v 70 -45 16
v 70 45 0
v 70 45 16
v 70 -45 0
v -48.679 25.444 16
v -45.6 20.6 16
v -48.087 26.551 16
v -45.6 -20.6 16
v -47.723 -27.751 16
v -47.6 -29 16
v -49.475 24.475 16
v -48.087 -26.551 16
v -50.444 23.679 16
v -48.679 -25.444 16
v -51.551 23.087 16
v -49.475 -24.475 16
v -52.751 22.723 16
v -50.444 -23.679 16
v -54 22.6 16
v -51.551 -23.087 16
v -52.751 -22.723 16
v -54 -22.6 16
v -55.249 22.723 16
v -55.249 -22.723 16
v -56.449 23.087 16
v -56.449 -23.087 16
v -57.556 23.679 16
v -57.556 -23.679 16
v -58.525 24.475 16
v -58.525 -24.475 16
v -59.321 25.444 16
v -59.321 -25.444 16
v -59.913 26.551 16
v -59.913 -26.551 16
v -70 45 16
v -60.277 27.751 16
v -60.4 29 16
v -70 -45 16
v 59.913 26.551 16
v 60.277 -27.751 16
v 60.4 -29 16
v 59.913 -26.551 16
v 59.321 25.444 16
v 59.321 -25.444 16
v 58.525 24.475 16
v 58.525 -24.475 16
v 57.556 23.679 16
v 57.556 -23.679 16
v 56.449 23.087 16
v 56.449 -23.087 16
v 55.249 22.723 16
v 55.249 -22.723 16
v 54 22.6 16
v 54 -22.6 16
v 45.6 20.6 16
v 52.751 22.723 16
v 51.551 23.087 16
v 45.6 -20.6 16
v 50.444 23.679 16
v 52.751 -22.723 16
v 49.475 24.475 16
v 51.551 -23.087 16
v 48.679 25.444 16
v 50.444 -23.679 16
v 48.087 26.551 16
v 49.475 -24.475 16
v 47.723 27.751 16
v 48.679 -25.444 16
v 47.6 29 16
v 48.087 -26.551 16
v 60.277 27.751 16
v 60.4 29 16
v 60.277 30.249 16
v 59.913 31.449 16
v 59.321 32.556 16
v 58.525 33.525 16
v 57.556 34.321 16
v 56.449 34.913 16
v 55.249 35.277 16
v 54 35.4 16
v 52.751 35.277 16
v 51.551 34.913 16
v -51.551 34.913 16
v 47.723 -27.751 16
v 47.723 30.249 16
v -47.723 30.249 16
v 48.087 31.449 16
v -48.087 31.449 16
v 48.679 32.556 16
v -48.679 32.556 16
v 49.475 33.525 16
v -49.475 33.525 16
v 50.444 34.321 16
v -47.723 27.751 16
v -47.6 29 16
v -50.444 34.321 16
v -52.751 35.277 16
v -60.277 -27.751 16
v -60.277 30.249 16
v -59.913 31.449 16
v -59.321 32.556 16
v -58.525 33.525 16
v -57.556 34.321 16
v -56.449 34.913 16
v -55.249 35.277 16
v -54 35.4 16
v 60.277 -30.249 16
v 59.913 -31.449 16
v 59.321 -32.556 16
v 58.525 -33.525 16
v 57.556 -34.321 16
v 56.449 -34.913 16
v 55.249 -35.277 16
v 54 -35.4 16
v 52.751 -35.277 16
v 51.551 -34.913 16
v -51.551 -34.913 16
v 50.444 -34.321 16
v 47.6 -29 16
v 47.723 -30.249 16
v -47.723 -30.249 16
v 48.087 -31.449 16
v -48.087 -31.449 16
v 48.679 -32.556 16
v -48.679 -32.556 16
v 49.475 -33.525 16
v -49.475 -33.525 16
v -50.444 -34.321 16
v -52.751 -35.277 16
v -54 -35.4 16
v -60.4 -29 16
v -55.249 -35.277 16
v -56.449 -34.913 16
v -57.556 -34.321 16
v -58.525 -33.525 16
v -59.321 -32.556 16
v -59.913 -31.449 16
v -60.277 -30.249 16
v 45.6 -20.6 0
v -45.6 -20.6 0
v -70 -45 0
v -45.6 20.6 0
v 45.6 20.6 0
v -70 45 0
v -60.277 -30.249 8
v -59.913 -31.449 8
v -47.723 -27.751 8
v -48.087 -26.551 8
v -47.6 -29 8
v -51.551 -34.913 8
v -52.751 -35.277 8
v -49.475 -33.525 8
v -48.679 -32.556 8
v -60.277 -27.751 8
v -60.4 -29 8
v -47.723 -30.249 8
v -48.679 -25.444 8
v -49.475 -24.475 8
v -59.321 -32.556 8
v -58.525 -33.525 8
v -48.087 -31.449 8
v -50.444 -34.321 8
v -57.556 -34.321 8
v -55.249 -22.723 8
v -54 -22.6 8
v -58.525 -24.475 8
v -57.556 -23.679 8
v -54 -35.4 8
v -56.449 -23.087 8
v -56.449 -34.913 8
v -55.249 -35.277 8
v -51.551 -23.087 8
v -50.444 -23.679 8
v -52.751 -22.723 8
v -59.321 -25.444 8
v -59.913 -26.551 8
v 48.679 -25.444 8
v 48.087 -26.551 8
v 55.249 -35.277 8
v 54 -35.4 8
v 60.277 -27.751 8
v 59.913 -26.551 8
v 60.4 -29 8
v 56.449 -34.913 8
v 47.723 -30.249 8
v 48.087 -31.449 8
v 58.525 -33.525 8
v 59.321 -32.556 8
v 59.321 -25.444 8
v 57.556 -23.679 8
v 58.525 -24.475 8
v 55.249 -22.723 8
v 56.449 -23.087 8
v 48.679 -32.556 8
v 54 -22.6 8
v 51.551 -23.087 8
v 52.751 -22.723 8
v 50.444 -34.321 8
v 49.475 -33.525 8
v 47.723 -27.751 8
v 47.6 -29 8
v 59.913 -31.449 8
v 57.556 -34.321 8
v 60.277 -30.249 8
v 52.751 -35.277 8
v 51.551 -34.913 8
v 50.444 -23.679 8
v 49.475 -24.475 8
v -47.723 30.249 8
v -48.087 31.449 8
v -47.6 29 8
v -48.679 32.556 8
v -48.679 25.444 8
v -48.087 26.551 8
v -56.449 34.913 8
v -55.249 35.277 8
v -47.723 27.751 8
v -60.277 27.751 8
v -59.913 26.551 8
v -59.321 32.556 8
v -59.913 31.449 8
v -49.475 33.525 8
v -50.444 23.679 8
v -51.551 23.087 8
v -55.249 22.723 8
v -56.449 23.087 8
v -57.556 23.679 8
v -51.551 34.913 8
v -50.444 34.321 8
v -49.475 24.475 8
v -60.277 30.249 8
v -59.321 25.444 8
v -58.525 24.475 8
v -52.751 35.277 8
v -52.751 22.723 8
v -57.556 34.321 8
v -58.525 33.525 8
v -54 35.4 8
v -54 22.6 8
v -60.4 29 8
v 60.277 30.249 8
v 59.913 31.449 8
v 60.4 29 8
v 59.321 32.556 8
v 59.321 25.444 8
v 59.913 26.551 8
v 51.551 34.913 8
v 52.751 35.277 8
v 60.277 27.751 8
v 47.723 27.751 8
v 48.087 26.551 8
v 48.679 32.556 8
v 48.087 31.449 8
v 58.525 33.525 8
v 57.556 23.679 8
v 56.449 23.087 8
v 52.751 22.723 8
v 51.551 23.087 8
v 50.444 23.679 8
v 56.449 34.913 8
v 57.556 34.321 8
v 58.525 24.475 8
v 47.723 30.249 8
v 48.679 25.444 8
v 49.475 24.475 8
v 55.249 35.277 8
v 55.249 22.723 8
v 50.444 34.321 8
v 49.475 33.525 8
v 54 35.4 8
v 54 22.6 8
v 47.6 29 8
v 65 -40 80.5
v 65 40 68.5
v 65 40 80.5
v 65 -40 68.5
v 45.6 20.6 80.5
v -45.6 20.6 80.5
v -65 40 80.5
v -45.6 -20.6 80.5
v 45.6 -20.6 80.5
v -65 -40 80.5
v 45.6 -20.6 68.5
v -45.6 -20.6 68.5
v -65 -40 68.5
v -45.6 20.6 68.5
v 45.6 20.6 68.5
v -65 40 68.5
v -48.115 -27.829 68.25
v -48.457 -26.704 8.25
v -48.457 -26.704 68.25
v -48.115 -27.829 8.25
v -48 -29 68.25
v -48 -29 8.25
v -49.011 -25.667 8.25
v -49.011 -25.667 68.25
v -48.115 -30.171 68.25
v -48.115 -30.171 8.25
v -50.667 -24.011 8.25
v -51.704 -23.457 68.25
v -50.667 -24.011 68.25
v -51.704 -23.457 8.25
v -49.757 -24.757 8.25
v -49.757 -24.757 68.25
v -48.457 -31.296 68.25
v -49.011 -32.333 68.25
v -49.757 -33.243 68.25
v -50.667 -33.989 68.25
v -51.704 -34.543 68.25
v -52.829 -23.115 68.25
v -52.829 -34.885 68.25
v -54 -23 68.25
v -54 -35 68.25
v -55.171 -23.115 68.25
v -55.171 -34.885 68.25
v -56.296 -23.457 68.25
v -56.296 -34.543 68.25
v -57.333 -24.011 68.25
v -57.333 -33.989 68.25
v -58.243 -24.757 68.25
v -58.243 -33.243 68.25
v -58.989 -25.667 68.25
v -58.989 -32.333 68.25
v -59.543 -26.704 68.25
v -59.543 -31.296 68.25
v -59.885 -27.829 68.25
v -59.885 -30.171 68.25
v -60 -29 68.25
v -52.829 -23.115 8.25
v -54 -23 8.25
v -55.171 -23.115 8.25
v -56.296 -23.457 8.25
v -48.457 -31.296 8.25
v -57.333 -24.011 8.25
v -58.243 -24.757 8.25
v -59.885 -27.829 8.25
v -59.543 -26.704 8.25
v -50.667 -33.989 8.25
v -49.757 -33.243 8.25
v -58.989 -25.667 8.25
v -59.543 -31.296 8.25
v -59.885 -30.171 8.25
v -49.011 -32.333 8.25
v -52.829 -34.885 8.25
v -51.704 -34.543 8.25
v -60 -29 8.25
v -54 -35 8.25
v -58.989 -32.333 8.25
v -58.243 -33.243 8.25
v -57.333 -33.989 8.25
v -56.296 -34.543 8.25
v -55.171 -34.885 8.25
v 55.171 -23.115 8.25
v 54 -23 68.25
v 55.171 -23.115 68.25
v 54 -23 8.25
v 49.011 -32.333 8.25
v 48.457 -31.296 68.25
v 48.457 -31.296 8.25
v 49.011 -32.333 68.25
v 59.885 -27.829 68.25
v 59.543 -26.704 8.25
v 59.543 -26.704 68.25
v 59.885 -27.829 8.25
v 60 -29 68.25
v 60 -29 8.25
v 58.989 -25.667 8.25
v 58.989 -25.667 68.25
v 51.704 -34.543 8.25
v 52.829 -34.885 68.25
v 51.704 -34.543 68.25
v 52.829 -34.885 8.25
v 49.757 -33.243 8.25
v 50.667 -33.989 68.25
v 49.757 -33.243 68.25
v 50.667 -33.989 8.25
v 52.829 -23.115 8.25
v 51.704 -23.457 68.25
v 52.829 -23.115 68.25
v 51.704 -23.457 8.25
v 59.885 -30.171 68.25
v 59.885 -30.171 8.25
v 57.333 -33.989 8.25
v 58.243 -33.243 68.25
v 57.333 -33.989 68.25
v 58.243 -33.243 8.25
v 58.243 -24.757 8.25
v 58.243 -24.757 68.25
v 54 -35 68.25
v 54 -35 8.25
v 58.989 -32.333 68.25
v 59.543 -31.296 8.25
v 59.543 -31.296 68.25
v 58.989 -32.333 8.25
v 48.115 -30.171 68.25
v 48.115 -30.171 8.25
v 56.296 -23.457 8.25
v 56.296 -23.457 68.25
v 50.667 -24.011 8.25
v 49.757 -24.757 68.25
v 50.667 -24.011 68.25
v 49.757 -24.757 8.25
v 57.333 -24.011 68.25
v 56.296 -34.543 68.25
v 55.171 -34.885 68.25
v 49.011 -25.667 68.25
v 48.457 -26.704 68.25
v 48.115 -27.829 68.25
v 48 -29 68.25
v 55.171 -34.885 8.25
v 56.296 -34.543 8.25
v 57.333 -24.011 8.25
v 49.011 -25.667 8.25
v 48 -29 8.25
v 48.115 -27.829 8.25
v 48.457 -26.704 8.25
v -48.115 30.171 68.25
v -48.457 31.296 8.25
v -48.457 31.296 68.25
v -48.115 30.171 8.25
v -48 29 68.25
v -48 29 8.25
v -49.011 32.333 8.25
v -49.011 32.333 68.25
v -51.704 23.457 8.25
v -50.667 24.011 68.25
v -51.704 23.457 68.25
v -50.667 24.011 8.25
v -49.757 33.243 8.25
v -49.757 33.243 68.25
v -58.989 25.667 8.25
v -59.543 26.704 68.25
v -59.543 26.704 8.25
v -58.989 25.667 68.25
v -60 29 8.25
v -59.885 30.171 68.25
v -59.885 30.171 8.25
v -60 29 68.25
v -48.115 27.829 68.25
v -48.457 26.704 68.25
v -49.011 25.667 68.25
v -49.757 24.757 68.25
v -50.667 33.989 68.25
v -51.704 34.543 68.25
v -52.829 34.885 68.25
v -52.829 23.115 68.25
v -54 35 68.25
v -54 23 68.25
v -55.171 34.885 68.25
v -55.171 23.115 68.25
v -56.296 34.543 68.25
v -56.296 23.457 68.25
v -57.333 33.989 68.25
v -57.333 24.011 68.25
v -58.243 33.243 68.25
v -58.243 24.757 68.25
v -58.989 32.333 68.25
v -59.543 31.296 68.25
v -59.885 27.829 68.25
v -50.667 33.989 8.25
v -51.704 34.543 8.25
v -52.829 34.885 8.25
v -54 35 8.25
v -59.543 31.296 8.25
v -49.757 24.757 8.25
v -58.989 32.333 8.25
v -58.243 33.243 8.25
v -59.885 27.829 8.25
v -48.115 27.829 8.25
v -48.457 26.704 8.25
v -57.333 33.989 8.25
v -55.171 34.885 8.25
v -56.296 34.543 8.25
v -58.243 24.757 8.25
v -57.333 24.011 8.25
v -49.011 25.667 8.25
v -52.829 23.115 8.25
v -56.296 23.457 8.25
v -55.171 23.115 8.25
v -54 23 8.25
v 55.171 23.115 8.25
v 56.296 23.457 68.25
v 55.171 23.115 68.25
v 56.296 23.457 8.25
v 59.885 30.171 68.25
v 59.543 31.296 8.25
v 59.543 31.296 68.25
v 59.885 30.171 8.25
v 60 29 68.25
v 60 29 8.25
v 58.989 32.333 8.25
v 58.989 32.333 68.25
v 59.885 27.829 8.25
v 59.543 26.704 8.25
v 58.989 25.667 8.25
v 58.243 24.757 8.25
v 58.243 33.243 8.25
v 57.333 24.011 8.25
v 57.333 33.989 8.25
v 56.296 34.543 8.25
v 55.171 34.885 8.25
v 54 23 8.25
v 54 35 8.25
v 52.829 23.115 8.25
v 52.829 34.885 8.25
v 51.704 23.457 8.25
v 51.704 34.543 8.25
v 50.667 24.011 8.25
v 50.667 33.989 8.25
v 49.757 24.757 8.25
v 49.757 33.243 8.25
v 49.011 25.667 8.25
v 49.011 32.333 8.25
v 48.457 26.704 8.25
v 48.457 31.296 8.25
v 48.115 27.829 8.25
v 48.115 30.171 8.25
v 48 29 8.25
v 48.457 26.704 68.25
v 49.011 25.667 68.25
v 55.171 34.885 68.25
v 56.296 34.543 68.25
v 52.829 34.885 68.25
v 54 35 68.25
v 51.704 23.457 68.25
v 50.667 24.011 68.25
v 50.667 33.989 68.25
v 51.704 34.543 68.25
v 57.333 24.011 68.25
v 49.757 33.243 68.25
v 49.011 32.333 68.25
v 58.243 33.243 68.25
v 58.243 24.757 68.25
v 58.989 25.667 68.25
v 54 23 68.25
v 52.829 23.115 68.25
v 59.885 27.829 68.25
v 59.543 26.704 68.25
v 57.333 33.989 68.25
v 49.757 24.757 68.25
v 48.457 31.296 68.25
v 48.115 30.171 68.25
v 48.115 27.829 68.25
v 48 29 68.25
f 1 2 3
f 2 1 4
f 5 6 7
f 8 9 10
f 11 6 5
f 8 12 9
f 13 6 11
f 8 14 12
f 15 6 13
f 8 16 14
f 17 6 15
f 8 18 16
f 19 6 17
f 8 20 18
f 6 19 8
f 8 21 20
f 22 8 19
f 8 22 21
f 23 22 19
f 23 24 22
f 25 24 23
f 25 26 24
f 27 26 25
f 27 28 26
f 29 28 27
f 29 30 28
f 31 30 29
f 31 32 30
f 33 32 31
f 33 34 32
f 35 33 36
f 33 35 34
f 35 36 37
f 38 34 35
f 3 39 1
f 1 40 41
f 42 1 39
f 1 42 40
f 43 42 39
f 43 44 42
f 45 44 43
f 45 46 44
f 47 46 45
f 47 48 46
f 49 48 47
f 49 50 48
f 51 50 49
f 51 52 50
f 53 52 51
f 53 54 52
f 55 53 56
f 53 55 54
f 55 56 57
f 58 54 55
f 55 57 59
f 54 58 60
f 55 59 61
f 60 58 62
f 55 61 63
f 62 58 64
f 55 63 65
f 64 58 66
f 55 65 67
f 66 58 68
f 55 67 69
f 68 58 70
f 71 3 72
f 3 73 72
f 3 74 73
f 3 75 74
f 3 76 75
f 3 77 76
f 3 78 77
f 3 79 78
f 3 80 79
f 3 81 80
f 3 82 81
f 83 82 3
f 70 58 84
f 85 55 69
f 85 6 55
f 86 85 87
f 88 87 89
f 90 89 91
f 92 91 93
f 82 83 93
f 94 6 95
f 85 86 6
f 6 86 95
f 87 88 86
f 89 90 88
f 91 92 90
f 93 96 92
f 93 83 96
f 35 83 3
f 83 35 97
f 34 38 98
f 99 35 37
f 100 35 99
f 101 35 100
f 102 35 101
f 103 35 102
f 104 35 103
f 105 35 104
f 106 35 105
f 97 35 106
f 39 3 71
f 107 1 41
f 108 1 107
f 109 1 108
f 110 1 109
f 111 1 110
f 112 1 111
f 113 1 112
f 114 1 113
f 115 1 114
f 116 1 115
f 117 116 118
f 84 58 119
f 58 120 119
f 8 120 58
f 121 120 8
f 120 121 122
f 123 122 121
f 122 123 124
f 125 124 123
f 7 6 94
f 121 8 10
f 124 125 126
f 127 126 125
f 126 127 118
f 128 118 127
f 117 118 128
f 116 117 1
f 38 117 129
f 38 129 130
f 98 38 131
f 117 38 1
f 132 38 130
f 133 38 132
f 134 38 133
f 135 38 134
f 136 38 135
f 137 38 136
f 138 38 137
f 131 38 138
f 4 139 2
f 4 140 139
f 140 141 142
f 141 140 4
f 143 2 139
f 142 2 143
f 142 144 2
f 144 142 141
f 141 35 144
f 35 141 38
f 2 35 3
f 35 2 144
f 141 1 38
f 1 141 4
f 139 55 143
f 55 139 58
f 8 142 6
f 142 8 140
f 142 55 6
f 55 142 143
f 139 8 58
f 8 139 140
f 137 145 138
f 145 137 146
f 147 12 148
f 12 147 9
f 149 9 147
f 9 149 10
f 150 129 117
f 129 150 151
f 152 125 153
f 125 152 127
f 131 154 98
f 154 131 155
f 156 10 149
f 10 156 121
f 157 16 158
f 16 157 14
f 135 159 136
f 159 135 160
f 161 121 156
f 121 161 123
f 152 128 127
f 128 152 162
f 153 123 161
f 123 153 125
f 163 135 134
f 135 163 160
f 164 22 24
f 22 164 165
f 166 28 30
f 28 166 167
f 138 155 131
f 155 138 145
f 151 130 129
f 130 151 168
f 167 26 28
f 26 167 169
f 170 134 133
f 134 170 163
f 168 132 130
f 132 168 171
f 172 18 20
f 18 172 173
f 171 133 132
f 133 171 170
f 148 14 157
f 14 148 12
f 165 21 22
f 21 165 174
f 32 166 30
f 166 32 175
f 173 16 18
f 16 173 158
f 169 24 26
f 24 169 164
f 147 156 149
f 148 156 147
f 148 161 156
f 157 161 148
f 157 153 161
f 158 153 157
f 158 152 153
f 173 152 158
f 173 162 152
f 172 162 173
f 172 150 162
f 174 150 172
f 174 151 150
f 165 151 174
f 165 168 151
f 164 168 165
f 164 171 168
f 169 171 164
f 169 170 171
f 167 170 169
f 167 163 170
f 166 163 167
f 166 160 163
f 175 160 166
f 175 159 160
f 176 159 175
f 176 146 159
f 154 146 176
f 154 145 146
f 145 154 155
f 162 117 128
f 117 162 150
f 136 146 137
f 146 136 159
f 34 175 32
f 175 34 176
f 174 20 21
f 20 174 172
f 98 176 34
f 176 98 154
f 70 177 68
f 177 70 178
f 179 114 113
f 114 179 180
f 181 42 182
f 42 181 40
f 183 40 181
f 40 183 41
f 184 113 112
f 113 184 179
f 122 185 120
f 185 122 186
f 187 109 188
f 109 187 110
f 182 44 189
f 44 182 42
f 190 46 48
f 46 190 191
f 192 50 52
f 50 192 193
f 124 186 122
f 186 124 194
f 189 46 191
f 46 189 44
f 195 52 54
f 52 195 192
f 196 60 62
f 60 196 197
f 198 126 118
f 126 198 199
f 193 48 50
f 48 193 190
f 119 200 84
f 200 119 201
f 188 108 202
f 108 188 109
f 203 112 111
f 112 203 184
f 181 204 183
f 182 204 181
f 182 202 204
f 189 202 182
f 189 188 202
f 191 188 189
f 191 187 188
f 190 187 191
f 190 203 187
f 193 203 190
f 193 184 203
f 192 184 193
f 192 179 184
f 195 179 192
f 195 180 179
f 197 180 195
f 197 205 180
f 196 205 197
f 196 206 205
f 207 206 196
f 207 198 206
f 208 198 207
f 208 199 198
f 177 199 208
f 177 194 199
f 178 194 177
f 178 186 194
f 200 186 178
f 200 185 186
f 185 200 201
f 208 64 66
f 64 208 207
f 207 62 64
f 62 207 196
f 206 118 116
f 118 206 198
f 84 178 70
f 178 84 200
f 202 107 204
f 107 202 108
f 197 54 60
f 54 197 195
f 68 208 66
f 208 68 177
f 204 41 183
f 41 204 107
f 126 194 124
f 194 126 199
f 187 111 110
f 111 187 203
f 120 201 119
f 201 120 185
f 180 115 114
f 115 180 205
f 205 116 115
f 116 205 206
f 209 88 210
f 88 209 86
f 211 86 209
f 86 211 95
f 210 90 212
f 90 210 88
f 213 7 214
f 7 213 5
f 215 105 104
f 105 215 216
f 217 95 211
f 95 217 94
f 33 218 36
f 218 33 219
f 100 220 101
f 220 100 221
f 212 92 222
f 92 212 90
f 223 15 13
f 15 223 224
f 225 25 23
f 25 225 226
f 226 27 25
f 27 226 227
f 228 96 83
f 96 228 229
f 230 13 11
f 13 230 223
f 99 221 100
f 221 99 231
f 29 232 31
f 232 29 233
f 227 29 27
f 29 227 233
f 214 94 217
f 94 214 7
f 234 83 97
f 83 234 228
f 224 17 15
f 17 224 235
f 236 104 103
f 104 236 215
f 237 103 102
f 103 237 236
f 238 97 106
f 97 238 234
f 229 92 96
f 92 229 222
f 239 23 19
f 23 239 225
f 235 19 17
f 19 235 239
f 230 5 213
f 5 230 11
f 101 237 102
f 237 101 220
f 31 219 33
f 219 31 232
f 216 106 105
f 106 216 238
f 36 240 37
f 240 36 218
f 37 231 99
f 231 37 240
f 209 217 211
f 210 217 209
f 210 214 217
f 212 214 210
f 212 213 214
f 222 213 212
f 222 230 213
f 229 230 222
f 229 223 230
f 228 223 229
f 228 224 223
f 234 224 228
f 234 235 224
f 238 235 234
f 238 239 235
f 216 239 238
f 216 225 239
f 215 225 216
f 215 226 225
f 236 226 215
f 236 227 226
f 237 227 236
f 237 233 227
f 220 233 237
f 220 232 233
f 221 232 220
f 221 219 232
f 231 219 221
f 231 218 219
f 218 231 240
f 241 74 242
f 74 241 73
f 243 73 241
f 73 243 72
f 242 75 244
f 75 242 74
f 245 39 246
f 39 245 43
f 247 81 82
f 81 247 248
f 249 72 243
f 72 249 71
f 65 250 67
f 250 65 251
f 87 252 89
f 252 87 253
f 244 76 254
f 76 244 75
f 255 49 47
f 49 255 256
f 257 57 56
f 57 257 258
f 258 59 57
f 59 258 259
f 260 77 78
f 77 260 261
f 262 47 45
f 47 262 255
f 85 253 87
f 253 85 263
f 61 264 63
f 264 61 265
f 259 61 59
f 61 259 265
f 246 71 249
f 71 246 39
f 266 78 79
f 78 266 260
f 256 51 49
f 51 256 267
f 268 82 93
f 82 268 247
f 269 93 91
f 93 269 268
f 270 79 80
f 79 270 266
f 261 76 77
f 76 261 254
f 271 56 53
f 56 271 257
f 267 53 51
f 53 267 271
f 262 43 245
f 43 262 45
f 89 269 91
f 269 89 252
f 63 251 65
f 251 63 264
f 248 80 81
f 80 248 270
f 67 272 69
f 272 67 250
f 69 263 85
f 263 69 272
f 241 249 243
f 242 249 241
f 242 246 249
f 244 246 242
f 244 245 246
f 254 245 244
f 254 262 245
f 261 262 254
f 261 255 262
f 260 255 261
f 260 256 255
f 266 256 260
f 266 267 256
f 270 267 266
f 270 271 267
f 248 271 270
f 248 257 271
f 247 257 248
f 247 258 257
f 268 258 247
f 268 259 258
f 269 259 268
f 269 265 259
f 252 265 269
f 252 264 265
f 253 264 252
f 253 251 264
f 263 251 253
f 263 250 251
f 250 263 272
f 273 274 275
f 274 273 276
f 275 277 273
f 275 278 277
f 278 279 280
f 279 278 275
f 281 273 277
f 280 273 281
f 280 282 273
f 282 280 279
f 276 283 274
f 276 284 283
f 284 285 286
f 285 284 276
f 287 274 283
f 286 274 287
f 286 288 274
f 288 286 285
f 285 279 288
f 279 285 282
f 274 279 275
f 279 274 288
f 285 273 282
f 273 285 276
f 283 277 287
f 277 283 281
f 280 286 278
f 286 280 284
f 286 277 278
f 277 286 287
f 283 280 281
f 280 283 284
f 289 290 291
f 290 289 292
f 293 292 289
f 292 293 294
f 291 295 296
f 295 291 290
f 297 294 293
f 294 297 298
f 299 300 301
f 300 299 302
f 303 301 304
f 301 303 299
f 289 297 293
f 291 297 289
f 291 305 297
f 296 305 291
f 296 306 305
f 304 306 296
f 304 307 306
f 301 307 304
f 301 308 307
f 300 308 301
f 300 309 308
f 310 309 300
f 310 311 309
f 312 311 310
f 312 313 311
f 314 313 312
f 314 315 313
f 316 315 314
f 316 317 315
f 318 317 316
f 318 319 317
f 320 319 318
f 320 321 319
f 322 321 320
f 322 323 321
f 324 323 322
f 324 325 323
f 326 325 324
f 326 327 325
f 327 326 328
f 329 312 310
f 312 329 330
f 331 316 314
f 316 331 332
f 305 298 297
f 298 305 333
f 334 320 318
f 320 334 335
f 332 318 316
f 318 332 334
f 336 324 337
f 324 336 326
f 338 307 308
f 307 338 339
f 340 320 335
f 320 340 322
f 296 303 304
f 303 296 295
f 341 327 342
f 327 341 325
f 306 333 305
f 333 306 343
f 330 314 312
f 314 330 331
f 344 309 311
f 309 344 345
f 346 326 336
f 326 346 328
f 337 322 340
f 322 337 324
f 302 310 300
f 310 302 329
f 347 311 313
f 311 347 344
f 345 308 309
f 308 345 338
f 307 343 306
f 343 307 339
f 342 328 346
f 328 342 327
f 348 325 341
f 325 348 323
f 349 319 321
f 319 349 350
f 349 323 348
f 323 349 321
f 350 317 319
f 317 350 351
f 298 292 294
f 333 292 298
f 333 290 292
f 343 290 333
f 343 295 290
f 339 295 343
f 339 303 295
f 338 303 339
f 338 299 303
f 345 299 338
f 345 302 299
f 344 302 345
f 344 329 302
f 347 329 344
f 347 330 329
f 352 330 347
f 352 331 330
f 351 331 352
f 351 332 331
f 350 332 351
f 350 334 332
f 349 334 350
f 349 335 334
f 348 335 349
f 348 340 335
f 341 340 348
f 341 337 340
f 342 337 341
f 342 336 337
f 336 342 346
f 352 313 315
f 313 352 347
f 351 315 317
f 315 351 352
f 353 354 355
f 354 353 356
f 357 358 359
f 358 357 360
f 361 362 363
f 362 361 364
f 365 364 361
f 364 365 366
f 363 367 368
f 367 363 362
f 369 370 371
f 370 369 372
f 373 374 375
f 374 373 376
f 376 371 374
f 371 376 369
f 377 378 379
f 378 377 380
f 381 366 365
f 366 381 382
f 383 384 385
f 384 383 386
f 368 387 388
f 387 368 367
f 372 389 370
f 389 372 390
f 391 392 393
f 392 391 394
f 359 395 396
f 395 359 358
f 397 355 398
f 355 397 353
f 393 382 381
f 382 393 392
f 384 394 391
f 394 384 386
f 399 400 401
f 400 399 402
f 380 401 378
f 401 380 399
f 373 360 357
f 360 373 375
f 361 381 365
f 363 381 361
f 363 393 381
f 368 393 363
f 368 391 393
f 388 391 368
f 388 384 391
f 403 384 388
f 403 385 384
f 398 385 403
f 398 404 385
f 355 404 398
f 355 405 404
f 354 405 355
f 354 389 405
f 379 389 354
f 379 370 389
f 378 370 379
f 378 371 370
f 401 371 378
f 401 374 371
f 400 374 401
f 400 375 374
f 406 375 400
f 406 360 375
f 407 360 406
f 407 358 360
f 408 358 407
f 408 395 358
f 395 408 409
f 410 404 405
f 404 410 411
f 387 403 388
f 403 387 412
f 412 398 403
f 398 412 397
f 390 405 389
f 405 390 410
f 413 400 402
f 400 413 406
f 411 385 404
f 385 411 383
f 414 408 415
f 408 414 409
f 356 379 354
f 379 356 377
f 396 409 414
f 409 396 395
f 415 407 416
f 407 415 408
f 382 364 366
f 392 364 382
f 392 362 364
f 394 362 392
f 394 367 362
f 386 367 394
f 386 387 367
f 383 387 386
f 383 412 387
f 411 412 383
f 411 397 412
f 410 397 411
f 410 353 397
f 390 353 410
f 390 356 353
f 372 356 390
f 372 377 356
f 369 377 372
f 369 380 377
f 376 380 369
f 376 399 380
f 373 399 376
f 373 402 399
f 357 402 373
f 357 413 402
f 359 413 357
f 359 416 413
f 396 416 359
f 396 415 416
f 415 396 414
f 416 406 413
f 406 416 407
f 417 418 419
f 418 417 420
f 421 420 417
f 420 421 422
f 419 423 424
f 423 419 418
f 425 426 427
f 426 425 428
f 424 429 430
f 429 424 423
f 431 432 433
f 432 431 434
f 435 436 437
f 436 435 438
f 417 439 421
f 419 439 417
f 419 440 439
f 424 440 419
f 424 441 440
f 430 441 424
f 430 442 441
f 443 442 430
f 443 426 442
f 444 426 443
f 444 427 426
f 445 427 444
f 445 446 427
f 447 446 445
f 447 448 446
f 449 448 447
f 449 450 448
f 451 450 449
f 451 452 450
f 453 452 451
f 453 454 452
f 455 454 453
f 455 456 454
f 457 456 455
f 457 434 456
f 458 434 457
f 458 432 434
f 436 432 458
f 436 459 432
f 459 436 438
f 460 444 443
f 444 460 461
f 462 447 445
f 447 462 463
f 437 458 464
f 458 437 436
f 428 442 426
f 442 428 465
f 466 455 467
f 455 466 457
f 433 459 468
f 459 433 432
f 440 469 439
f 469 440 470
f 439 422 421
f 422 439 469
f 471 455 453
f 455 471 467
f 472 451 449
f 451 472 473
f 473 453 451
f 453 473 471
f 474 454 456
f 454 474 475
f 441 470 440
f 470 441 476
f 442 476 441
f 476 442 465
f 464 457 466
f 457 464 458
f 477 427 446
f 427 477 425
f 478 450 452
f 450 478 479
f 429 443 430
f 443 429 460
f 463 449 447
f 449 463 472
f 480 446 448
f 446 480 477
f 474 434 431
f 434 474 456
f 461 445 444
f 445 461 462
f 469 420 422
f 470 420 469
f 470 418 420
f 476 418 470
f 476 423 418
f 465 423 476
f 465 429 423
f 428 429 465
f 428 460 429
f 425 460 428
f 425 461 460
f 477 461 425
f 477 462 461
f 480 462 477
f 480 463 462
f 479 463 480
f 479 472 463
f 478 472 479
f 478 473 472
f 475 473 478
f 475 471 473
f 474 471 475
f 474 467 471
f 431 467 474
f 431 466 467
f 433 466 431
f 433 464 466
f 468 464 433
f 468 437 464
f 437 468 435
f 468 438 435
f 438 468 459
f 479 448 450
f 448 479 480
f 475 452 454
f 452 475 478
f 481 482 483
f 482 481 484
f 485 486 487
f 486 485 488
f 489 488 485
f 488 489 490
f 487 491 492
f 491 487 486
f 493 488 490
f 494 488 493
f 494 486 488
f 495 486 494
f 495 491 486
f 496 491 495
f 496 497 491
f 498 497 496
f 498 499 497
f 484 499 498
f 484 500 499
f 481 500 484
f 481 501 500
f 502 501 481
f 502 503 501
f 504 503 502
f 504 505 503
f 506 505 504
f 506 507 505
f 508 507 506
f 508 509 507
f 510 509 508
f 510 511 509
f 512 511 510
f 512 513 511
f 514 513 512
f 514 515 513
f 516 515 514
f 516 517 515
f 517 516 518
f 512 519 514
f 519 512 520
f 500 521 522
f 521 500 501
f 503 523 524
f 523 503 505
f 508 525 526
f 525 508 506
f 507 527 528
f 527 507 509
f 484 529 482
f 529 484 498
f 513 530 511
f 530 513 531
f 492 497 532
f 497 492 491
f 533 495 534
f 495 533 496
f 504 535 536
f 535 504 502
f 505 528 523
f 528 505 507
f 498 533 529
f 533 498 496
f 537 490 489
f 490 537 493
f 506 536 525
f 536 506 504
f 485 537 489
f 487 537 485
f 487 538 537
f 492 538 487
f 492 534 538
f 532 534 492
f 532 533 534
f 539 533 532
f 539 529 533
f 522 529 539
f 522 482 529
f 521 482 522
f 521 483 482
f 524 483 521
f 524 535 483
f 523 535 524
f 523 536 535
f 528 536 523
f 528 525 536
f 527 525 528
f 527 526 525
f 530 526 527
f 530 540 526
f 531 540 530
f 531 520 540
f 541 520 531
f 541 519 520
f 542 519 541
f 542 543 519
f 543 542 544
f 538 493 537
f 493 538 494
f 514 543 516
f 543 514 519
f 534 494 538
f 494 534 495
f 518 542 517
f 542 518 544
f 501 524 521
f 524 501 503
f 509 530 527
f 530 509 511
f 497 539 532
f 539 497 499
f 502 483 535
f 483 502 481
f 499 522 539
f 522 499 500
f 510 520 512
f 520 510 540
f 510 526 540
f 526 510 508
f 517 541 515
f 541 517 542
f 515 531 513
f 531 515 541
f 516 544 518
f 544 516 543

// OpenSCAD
$fn = 32;

// ------------------------------------------------------------------------
// Frame cube: base 140 x 90 mm, posts 60 mm tall
// Every part is its own module, assembly() places every instance.
// ------------------------------------------------------------------------

// --- part 1 ---
module base_frame() {
  difference() {
    translate([-70, -45, 0]) cube([140, 90, 16]);
    translate([-45.6, -20.6, -1]) cube([91.2, 41.2, 18]);
    translate([-54, -29, 8]) cylinder(h = 9, d = 12.8);
    translate([54, -29, 8]) cylinder(h = 9, d = 12.8);
    translate([-54, 29, 8]) cylinder(h = 9, d = 12.8);
    translate([54, 29, 8]) cylinder(h = 9, d = 12.8);
  }
}

// --- part 2 ---
module corner_post() {
  cylinder(h = 60, d = 12);
}

// --- part 3 ---
module top_frame() {
  difference() {
    translate([-65, -40, 0]) cube([130, 80, 12]);
    translate([-45.6, -20.6, -1]) cube([91.2, 41.2, 14]);
  }
}

// --- assembly ---
module assembly() {
  color([0.80, 0.24, 0.20]) translate([0, 0, 0]) rotate([0, 0, 0]) base_frame();
  color([0.20, 0.45, 0.75]) translate([-54, -29, 8.25]) rotate([0, 0, 0]) corner_post();
  color([0.25, 0.62, 0.32]) translate([54, -29, 8.25]) rotate([0, 0, 0]) corner_post();
  color([0.92, 0.70, 0.18]) translate([-54, 29, 8.25]) rotate([0, 0, 0]) corner_post();
  color([0.58, 0.35, 0.70]) translate([54, 29, 8.25]) rotate([0, 0, 0]) corner_post();
  color([0.16, 0.66, 0.66]) translate([0, 0, 68.5]) rotate([0, 0, 0]) top_frame();
}

assembly();
